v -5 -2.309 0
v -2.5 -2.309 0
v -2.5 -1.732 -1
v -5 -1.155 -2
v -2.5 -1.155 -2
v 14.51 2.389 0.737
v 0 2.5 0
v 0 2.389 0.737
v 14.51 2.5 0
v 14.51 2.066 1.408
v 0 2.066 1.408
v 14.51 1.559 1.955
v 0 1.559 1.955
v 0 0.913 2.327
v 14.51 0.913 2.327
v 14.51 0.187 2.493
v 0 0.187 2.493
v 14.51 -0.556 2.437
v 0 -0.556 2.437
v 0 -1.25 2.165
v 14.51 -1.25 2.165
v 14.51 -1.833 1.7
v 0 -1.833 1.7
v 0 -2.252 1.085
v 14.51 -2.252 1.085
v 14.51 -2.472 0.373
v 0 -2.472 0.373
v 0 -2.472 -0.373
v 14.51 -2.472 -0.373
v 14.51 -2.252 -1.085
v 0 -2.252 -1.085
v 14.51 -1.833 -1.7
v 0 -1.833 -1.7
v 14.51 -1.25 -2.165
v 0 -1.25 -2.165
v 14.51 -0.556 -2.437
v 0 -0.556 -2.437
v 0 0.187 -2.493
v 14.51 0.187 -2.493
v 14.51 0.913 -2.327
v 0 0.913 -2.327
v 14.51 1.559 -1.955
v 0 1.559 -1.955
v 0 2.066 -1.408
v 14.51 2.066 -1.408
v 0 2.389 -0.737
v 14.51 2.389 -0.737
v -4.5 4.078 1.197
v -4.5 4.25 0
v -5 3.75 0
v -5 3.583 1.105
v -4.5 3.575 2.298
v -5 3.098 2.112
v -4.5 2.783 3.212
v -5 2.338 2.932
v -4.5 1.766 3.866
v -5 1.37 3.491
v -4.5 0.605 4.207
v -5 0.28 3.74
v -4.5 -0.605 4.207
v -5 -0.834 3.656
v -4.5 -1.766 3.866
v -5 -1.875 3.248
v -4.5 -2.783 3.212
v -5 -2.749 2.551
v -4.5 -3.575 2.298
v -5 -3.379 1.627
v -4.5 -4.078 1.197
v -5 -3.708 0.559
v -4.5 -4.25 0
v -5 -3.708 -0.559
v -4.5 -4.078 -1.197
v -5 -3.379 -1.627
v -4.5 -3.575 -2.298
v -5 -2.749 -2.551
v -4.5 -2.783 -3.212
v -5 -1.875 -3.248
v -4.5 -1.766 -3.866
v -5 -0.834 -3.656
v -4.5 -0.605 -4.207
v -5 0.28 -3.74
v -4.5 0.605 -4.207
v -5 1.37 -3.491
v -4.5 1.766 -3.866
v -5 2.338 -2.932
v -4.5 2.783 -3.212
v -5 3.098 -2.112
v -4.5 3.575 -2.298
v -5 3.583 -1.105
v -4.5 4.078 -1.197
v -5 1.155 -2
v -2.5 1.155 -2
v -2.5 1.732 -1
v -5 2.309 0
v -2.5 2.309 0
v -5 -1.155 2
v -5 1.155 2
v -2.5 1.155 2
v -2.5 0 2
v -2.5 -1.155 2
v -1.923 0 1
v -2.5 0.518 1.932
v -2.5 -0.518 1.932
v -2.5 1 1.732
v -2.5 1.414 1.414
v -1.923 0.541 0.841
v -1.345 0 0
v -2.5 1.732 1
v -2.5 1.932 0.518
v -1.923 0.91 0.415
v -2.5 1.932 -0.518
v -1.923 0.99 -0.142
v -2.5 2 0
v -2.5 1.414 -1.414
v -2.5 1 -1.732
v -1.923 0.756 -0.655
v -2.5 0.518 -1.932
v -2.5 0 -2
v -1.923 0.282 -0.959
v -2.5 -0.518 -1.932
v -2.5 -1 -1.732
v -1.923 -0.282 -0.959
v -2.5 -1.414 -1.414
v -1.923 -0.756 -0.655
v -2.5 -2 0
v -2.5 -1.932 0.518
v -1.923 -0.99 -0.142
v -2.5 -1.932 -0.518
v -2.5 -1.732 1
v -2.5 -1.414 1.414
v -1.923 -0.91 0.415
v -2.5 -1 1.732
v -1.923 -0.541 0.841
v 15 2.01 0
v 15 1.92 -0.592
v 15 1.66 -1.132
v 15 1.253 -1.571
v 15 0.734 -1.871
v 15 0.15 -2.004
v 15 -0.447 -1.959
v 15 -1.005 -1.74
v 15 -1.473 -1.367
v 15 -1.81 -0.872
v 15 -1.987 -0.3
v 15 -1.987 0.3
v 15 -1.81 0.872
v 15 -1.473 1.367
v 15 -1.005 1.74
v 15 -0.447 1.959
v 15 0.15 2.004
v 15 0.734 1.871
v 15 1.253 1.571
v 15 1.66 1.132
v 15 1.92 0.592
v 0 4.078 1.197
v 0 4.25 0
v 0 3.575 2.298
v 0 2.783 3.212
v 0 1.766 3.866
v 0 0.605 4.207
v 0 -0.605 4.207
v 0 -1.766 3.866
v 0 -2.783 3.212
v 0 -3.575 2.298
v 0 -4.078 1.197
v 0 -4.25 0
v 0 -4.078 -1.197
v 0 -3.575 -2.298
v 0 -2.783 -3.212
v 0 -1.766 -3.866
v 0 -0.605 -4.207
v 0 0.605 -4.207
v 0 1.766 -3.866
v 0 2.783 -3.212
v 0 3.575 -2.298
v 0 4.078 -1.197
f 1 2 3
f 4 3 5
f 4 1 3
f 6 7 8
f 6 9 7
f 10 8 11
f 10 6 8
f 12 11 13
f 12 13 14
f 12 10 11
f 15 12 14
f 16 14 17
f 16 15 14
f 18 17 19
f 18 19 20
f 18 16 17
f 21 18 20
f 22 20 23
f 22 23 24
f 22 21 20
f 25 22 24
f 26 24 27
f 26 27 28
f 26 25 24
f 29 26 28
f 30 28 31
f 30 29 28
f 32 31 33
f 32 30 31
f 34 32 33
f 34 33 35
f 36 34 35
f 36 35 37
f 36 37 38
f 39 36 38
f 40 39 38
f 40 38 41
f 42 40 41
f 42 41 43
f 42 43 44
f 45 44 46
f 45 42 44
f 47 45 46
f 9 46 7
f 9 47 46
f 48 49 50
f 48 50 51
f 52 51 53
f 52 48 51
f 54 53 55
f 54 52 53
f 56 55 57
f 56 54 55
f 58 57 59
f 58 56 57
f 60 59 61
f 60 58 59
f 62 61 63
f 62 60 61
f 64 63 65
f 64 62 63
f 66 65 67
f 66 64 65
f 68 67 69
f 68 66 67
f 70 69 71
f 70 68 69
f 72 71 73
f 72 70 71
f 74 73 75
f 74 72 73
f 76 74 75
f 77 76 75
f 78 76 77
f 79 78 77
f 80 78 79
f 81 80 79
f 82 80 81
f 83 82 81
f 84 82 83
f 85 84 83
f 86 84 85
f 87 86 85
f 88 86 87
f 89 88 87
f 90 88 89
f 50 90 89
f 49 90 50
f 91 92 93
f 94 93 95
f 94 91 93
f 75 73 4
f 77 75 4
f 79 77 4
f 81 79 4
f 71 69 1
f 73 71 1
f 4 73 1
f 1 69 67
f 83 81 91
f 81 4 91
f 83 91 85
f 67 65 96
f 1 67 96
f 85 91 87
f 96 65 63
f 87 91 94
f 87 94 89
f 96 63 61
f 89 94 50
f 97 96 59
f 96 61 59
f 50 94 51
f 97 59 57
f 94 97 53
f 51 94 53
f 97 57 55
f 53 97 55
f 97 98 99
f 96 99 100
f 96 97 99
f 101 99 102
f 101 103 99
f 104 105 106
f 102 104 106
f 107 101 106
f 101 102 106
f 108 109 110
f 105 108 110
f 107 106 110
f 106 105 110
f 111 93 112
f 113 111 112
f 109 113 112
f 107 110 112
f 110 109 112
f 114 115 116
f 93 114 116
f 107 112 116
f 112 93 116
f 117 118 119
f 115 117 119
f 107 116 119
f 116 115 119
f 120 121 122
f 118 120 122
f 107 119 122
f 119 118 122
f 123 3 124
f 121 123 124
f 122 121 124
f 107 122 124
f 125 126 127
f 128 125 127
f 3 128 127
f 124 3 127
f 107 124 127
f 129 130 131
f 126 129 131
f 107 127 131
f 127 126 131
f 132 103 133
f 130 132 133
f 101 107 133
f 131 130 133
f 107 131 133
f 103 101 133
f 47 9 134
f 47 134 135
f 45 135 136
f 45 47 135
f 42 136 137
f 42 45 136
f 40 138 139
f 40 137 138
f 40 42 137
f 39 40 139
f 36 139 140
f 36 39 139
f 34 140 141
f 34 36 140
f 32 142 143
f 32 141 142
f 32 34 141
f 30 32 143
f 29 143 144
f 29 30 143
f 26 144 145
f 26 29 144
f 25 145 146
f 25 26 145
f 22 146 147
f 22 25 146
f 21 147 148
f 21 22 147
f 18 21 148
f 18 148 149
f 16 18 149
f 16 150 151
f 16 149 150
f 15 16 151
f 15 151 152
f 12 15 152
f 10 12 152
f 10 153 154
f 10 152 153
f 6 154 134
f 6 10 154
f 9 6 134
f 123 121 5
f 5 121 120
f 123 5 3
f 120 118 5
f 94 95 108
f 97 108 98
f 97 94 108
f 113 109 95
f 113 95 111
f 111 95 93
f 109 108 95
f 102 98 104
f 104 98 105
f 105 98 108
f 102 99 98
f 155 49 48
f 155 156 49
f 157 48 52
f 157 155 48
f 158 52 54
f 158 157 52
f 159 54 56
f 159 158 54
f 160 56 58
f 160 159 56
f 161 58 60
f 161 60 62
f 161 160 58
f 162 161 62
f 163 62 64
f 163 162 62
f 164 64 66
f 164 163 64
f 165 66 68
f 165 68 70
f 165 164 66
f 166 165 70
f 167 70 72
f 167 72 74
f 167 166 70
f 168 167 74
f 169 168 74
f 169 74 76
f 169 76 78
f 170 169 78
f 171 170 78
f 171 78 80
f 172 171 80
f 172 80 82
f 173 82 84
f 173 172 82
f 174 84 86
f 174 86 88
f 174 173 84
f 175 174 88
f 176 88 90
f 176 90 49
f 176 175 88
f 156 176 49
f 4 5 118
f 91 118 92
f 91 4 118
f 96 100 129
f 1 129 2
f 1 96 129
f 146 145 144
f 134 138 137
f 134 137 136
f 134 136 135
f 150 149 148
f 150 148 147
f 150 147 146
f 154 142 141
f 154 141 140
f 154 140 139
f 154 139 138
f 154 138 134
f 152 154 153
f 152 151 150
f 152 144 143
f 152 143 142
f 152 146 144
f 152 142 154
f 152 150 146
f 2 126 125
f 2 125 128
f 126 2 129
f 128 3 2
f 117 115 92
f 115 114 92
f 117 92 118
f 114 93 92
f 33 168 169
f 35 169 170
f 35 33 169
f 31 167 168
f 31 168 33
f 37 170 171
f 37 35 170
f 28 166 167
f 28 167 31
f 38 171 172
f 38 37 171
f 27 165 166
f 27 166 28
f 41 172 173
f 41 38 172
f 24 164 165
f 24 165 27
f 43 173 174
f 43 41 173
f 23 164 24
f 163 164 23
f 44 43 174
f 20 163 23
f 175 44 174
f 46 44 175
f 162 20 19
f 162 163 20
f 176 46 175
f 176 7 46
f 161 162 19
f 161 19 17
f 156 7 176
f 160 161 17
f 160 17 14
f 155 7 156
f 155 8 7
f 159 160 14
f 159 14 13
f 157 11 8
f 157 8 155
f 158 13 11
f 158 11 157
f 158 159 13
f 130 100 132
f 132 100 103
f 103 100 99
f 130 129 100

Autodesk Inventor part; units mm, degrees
sketch "Sketch_1" plane through (0, 0, 0) normal (0, 0, 1) x (1, 0, 0)
  line L0 (15, 0) -> (-5, 0)
  line L1 (-5, 0) -> (-5, 3.75)
  line L2 (-5, 3.75) -> (-4.5, 4.25)
  line L3 (-4.5, 4.25) -> (0, 4.25)
  line L4 (0, 4.25) -> (0, 2.5)
  line L5 (0, 2.5) -> (14.5095, 2.5)
  line L6 (14.5095, 2.5) -> (15, 2.0095)
  line L7 (15, 2.0095) -> (15, 0)
  line L8 (15, 0) -> (-5, 0)
revolve "Revolution1" add sketch "Sketch_1" angle 360 about axis through (15, 0, 0) along (1, 0, 0)
thread "Thread1" size "M5x0.8" class "6g" standard "ISO Metric profile" length 13.7095
sketch "Sketch2" plane through (-5, 0, 0) normal (-1, 0, 0) x (0, 0, 1)
  point P0 (0, 0)
hole "Hole1" at (-5, 0, 0) direction (1, 0, 0) diameter 4 depth 2.5 tip angle 120
sketch "Sketch_3" plane through (-5, 0, 0) normal (1, 0, 0) x (0, 0, -1)
  line L0 (-2, -1.1547) -> (0, -2.3094)
  line L1 (0, -2.3094) -> (2, -1.1547)
  line L2 (2, -1.1547) -> (2, 1.1547)
  line L3 (2, 1.1547) -> (0, 2.3094)
  line L4 (0, 2.3094) -> (-2, 1.1547)
  line L5 (-2, 1.1547) -> (-2, -1.1547)
extrude "Extrusion1" cut sketch "Sketch_3" along normal blind 2.5
ref_plane "bolt_XY" through (15, 0, 0) normal (1, 0, 0) x (0, 0, -1)
ref_plane "bolt_YZ" through (15, 0, 0) normal (0, 0, -1) x (0, 1, 0)
ref_plane "bolt_ZX" through (15, 0, 0) normal (0, 1, 0) x (1, 0, 0)
ref_plane "nut_XY" through (0, 0, 0) normal (1, 0, 0) x (0, 0, -1)
ref_plane "nut_YZ" through (0, 0, 0) normal (0, 0, -1) x (0, 1, 0)
ref_plane "nut_ZX" through (0, 0, 0) normal (0, 1, 0) x (1, 0, 0)
properties part number "CBE5-15"
